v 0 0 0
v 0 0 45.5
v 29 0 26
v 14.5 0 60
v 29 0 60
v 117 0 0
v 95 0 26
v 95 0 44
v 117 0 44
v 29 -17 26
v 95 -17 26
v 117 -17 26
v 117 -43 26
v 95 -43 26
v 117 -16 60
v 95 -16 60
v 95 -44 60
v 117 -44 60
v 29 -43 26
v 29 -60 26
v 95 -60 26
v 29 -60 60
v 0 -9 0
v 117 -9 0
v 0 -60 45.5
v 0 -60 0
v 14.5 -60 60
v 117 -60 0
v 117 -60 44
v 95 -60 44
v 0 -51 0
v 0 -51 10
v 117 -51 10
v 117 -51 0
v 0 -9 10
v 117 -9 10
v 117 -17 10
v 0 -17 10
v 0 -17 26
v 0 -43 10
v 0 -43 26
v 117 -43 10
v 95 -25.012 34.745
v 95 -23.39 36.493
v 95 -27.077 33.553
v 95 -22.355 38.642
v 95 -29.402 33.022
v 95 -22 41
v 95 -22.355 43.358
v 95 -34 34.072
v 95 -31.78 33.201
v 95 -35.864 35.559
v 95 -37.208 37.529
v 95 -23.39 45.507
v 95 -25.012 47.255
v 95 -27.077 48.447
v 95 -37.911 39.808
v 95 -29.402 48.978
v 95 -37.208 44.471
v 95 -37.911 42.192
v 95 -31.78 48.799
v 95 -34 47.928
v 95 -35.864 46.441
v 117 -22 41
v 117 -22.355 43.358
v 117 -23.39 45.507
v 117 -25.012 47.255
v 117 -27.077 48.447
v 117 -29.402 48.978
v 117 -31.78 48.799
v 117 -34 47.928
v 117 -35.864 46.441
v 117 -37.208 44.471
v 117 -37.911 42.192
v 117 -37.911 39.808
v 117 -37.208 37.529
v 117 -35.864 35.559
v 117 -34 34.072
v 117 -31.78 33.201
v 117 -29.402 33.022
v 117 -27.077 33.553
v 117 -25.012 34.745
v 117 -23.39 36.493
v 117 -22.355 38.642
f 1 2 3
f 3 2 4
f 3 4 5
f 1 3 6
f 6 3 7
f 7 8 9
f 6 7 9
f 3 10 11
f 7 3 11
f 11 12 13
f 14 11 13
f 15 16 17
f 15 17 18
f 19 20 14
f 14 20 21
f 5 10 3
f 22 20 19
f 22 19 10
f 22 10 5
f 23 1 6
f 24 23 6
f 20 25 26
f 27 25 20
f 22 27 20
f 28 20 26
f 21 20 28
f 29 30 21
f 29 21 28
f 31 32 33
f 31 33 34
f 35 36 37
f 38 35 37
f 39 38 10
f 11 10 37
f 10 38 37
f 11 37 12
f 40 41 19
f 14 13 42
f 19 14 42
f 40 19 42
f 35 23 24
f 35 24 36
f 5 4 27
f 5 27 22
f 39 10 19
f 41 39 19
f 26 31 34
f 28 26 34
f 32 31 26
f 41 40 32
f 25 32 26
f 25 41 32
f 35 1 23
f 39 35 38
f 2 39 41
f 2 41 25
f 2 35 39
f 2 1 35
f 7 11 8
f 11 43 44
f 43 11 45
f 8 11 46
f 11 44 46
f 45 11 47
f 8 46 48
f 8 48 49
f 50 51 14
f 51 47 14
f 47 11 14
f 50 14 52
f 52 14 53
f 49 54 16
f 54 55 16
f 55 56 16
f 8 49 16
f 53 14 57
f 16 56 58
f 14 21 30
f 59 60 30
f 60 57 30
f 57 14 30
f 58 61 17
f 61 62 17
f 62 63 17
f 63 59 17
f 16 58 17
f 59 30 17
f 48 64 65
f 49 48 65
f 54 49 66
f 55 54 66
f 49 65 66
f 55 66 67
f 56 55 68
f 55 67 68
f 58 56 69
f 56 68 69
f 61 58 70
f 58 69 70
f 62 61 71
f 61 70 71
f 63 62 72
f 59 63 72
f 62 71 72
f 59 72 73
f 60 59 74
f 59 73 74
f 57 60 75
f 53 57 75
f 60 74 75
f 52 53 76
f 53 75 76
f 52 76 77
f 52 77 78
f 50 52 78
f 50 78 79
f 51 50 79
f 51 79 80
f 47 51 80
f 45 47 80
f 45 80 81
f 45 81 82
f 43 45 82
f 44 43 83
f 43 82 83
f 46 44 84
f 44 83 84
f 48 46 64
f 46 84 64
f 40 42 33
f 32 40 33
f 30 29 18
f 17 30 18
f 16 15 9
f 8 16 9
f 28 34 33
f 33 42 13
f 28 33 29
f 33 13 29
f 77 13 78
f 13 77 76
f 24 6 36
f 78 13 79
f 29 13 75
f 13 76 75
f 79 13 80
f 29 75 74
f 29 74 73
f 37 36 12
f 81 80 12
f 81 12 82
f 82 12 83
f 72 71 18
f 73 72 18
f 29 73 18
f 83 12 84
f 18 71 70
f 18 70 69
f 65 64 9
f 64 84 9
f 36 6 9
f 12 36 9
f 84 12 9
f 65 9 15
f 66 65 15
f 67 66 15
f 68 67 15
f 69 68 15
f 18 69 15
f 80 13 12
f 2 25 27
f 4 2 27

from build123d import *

# Parameters (mm, degrees)
F0_W      = 117
F0_H      = 60
F1_DEPTH  = 60
F2_W      = 66
F2_H      = 34
F3_DEPTH  = 60.001
F5_DEPTH  = 60.001
F7_DEPTH  = 117.001
F9_DEPTH  = 22
F10_R     = 8
F11_DEPTH = 22


with BuildPart() as f1:
    # F0 (on Front) → F1 (new body)
    with BuildSketch(Plane.XZ):
        with Locations((58.5, 30)):
            Rectangle(F0_W, F0_H)
    extrude(amount=F1_DEPTH)

    # F2 (on face) → F3 (cut, through all)
    with BuildSketch(Plane.XZ.offset(60)):
        with Locations((62, 43)):
            Rectangle(F2_W, F2_H)
    extrude(amount=-F3_DEPTH, mode=Mode.SUBTRACT)

    # F4 (on face) → F5 (cut, through all)
    with BuildSketch(Plane.XZ.offset(60)):
        Polygon((0, 45.5), (14.5, 60), (0, 60), align=None)
    extrude(amount=-F5_DEPTH, mode=Mode.SUBTRACT)

    # F6 (on face) → F7 (cut, through all)
    with BuildSketch(Plane.YZ.offset(117)):
        Polygon((-51, 10), (-51, 0), (-9, 0), (-9, 10), (-17, 10), (-17, 26), (-43, 26), (-43, 10), align=None)
    extrude(amount=-F7_DEPTH, mode=Mode.SUBTRACT)

    # F8 (on face) → F9 (cut)
    with BuildSketch(Plane.YZ.offset(117)):
        Polygon((-44, 60), (-60, 60), (-60, 44), align=None)
        Polygon((0, 60), (-16, 60), (0, 44), align=None)
    extrude(amount=-F9_DEPTH, mode=Mode.SUBTRACT)

    # F10 (on face) → F11 (cut)
    with BuildSketch(Plane.YZ.offset(117)):
        with Locations((-30, 41)):
            Circle(F10_R)
    extrude(amount=-F11_DEPTH, mode=Mode.SUBTRACT)


solid = f1.part
